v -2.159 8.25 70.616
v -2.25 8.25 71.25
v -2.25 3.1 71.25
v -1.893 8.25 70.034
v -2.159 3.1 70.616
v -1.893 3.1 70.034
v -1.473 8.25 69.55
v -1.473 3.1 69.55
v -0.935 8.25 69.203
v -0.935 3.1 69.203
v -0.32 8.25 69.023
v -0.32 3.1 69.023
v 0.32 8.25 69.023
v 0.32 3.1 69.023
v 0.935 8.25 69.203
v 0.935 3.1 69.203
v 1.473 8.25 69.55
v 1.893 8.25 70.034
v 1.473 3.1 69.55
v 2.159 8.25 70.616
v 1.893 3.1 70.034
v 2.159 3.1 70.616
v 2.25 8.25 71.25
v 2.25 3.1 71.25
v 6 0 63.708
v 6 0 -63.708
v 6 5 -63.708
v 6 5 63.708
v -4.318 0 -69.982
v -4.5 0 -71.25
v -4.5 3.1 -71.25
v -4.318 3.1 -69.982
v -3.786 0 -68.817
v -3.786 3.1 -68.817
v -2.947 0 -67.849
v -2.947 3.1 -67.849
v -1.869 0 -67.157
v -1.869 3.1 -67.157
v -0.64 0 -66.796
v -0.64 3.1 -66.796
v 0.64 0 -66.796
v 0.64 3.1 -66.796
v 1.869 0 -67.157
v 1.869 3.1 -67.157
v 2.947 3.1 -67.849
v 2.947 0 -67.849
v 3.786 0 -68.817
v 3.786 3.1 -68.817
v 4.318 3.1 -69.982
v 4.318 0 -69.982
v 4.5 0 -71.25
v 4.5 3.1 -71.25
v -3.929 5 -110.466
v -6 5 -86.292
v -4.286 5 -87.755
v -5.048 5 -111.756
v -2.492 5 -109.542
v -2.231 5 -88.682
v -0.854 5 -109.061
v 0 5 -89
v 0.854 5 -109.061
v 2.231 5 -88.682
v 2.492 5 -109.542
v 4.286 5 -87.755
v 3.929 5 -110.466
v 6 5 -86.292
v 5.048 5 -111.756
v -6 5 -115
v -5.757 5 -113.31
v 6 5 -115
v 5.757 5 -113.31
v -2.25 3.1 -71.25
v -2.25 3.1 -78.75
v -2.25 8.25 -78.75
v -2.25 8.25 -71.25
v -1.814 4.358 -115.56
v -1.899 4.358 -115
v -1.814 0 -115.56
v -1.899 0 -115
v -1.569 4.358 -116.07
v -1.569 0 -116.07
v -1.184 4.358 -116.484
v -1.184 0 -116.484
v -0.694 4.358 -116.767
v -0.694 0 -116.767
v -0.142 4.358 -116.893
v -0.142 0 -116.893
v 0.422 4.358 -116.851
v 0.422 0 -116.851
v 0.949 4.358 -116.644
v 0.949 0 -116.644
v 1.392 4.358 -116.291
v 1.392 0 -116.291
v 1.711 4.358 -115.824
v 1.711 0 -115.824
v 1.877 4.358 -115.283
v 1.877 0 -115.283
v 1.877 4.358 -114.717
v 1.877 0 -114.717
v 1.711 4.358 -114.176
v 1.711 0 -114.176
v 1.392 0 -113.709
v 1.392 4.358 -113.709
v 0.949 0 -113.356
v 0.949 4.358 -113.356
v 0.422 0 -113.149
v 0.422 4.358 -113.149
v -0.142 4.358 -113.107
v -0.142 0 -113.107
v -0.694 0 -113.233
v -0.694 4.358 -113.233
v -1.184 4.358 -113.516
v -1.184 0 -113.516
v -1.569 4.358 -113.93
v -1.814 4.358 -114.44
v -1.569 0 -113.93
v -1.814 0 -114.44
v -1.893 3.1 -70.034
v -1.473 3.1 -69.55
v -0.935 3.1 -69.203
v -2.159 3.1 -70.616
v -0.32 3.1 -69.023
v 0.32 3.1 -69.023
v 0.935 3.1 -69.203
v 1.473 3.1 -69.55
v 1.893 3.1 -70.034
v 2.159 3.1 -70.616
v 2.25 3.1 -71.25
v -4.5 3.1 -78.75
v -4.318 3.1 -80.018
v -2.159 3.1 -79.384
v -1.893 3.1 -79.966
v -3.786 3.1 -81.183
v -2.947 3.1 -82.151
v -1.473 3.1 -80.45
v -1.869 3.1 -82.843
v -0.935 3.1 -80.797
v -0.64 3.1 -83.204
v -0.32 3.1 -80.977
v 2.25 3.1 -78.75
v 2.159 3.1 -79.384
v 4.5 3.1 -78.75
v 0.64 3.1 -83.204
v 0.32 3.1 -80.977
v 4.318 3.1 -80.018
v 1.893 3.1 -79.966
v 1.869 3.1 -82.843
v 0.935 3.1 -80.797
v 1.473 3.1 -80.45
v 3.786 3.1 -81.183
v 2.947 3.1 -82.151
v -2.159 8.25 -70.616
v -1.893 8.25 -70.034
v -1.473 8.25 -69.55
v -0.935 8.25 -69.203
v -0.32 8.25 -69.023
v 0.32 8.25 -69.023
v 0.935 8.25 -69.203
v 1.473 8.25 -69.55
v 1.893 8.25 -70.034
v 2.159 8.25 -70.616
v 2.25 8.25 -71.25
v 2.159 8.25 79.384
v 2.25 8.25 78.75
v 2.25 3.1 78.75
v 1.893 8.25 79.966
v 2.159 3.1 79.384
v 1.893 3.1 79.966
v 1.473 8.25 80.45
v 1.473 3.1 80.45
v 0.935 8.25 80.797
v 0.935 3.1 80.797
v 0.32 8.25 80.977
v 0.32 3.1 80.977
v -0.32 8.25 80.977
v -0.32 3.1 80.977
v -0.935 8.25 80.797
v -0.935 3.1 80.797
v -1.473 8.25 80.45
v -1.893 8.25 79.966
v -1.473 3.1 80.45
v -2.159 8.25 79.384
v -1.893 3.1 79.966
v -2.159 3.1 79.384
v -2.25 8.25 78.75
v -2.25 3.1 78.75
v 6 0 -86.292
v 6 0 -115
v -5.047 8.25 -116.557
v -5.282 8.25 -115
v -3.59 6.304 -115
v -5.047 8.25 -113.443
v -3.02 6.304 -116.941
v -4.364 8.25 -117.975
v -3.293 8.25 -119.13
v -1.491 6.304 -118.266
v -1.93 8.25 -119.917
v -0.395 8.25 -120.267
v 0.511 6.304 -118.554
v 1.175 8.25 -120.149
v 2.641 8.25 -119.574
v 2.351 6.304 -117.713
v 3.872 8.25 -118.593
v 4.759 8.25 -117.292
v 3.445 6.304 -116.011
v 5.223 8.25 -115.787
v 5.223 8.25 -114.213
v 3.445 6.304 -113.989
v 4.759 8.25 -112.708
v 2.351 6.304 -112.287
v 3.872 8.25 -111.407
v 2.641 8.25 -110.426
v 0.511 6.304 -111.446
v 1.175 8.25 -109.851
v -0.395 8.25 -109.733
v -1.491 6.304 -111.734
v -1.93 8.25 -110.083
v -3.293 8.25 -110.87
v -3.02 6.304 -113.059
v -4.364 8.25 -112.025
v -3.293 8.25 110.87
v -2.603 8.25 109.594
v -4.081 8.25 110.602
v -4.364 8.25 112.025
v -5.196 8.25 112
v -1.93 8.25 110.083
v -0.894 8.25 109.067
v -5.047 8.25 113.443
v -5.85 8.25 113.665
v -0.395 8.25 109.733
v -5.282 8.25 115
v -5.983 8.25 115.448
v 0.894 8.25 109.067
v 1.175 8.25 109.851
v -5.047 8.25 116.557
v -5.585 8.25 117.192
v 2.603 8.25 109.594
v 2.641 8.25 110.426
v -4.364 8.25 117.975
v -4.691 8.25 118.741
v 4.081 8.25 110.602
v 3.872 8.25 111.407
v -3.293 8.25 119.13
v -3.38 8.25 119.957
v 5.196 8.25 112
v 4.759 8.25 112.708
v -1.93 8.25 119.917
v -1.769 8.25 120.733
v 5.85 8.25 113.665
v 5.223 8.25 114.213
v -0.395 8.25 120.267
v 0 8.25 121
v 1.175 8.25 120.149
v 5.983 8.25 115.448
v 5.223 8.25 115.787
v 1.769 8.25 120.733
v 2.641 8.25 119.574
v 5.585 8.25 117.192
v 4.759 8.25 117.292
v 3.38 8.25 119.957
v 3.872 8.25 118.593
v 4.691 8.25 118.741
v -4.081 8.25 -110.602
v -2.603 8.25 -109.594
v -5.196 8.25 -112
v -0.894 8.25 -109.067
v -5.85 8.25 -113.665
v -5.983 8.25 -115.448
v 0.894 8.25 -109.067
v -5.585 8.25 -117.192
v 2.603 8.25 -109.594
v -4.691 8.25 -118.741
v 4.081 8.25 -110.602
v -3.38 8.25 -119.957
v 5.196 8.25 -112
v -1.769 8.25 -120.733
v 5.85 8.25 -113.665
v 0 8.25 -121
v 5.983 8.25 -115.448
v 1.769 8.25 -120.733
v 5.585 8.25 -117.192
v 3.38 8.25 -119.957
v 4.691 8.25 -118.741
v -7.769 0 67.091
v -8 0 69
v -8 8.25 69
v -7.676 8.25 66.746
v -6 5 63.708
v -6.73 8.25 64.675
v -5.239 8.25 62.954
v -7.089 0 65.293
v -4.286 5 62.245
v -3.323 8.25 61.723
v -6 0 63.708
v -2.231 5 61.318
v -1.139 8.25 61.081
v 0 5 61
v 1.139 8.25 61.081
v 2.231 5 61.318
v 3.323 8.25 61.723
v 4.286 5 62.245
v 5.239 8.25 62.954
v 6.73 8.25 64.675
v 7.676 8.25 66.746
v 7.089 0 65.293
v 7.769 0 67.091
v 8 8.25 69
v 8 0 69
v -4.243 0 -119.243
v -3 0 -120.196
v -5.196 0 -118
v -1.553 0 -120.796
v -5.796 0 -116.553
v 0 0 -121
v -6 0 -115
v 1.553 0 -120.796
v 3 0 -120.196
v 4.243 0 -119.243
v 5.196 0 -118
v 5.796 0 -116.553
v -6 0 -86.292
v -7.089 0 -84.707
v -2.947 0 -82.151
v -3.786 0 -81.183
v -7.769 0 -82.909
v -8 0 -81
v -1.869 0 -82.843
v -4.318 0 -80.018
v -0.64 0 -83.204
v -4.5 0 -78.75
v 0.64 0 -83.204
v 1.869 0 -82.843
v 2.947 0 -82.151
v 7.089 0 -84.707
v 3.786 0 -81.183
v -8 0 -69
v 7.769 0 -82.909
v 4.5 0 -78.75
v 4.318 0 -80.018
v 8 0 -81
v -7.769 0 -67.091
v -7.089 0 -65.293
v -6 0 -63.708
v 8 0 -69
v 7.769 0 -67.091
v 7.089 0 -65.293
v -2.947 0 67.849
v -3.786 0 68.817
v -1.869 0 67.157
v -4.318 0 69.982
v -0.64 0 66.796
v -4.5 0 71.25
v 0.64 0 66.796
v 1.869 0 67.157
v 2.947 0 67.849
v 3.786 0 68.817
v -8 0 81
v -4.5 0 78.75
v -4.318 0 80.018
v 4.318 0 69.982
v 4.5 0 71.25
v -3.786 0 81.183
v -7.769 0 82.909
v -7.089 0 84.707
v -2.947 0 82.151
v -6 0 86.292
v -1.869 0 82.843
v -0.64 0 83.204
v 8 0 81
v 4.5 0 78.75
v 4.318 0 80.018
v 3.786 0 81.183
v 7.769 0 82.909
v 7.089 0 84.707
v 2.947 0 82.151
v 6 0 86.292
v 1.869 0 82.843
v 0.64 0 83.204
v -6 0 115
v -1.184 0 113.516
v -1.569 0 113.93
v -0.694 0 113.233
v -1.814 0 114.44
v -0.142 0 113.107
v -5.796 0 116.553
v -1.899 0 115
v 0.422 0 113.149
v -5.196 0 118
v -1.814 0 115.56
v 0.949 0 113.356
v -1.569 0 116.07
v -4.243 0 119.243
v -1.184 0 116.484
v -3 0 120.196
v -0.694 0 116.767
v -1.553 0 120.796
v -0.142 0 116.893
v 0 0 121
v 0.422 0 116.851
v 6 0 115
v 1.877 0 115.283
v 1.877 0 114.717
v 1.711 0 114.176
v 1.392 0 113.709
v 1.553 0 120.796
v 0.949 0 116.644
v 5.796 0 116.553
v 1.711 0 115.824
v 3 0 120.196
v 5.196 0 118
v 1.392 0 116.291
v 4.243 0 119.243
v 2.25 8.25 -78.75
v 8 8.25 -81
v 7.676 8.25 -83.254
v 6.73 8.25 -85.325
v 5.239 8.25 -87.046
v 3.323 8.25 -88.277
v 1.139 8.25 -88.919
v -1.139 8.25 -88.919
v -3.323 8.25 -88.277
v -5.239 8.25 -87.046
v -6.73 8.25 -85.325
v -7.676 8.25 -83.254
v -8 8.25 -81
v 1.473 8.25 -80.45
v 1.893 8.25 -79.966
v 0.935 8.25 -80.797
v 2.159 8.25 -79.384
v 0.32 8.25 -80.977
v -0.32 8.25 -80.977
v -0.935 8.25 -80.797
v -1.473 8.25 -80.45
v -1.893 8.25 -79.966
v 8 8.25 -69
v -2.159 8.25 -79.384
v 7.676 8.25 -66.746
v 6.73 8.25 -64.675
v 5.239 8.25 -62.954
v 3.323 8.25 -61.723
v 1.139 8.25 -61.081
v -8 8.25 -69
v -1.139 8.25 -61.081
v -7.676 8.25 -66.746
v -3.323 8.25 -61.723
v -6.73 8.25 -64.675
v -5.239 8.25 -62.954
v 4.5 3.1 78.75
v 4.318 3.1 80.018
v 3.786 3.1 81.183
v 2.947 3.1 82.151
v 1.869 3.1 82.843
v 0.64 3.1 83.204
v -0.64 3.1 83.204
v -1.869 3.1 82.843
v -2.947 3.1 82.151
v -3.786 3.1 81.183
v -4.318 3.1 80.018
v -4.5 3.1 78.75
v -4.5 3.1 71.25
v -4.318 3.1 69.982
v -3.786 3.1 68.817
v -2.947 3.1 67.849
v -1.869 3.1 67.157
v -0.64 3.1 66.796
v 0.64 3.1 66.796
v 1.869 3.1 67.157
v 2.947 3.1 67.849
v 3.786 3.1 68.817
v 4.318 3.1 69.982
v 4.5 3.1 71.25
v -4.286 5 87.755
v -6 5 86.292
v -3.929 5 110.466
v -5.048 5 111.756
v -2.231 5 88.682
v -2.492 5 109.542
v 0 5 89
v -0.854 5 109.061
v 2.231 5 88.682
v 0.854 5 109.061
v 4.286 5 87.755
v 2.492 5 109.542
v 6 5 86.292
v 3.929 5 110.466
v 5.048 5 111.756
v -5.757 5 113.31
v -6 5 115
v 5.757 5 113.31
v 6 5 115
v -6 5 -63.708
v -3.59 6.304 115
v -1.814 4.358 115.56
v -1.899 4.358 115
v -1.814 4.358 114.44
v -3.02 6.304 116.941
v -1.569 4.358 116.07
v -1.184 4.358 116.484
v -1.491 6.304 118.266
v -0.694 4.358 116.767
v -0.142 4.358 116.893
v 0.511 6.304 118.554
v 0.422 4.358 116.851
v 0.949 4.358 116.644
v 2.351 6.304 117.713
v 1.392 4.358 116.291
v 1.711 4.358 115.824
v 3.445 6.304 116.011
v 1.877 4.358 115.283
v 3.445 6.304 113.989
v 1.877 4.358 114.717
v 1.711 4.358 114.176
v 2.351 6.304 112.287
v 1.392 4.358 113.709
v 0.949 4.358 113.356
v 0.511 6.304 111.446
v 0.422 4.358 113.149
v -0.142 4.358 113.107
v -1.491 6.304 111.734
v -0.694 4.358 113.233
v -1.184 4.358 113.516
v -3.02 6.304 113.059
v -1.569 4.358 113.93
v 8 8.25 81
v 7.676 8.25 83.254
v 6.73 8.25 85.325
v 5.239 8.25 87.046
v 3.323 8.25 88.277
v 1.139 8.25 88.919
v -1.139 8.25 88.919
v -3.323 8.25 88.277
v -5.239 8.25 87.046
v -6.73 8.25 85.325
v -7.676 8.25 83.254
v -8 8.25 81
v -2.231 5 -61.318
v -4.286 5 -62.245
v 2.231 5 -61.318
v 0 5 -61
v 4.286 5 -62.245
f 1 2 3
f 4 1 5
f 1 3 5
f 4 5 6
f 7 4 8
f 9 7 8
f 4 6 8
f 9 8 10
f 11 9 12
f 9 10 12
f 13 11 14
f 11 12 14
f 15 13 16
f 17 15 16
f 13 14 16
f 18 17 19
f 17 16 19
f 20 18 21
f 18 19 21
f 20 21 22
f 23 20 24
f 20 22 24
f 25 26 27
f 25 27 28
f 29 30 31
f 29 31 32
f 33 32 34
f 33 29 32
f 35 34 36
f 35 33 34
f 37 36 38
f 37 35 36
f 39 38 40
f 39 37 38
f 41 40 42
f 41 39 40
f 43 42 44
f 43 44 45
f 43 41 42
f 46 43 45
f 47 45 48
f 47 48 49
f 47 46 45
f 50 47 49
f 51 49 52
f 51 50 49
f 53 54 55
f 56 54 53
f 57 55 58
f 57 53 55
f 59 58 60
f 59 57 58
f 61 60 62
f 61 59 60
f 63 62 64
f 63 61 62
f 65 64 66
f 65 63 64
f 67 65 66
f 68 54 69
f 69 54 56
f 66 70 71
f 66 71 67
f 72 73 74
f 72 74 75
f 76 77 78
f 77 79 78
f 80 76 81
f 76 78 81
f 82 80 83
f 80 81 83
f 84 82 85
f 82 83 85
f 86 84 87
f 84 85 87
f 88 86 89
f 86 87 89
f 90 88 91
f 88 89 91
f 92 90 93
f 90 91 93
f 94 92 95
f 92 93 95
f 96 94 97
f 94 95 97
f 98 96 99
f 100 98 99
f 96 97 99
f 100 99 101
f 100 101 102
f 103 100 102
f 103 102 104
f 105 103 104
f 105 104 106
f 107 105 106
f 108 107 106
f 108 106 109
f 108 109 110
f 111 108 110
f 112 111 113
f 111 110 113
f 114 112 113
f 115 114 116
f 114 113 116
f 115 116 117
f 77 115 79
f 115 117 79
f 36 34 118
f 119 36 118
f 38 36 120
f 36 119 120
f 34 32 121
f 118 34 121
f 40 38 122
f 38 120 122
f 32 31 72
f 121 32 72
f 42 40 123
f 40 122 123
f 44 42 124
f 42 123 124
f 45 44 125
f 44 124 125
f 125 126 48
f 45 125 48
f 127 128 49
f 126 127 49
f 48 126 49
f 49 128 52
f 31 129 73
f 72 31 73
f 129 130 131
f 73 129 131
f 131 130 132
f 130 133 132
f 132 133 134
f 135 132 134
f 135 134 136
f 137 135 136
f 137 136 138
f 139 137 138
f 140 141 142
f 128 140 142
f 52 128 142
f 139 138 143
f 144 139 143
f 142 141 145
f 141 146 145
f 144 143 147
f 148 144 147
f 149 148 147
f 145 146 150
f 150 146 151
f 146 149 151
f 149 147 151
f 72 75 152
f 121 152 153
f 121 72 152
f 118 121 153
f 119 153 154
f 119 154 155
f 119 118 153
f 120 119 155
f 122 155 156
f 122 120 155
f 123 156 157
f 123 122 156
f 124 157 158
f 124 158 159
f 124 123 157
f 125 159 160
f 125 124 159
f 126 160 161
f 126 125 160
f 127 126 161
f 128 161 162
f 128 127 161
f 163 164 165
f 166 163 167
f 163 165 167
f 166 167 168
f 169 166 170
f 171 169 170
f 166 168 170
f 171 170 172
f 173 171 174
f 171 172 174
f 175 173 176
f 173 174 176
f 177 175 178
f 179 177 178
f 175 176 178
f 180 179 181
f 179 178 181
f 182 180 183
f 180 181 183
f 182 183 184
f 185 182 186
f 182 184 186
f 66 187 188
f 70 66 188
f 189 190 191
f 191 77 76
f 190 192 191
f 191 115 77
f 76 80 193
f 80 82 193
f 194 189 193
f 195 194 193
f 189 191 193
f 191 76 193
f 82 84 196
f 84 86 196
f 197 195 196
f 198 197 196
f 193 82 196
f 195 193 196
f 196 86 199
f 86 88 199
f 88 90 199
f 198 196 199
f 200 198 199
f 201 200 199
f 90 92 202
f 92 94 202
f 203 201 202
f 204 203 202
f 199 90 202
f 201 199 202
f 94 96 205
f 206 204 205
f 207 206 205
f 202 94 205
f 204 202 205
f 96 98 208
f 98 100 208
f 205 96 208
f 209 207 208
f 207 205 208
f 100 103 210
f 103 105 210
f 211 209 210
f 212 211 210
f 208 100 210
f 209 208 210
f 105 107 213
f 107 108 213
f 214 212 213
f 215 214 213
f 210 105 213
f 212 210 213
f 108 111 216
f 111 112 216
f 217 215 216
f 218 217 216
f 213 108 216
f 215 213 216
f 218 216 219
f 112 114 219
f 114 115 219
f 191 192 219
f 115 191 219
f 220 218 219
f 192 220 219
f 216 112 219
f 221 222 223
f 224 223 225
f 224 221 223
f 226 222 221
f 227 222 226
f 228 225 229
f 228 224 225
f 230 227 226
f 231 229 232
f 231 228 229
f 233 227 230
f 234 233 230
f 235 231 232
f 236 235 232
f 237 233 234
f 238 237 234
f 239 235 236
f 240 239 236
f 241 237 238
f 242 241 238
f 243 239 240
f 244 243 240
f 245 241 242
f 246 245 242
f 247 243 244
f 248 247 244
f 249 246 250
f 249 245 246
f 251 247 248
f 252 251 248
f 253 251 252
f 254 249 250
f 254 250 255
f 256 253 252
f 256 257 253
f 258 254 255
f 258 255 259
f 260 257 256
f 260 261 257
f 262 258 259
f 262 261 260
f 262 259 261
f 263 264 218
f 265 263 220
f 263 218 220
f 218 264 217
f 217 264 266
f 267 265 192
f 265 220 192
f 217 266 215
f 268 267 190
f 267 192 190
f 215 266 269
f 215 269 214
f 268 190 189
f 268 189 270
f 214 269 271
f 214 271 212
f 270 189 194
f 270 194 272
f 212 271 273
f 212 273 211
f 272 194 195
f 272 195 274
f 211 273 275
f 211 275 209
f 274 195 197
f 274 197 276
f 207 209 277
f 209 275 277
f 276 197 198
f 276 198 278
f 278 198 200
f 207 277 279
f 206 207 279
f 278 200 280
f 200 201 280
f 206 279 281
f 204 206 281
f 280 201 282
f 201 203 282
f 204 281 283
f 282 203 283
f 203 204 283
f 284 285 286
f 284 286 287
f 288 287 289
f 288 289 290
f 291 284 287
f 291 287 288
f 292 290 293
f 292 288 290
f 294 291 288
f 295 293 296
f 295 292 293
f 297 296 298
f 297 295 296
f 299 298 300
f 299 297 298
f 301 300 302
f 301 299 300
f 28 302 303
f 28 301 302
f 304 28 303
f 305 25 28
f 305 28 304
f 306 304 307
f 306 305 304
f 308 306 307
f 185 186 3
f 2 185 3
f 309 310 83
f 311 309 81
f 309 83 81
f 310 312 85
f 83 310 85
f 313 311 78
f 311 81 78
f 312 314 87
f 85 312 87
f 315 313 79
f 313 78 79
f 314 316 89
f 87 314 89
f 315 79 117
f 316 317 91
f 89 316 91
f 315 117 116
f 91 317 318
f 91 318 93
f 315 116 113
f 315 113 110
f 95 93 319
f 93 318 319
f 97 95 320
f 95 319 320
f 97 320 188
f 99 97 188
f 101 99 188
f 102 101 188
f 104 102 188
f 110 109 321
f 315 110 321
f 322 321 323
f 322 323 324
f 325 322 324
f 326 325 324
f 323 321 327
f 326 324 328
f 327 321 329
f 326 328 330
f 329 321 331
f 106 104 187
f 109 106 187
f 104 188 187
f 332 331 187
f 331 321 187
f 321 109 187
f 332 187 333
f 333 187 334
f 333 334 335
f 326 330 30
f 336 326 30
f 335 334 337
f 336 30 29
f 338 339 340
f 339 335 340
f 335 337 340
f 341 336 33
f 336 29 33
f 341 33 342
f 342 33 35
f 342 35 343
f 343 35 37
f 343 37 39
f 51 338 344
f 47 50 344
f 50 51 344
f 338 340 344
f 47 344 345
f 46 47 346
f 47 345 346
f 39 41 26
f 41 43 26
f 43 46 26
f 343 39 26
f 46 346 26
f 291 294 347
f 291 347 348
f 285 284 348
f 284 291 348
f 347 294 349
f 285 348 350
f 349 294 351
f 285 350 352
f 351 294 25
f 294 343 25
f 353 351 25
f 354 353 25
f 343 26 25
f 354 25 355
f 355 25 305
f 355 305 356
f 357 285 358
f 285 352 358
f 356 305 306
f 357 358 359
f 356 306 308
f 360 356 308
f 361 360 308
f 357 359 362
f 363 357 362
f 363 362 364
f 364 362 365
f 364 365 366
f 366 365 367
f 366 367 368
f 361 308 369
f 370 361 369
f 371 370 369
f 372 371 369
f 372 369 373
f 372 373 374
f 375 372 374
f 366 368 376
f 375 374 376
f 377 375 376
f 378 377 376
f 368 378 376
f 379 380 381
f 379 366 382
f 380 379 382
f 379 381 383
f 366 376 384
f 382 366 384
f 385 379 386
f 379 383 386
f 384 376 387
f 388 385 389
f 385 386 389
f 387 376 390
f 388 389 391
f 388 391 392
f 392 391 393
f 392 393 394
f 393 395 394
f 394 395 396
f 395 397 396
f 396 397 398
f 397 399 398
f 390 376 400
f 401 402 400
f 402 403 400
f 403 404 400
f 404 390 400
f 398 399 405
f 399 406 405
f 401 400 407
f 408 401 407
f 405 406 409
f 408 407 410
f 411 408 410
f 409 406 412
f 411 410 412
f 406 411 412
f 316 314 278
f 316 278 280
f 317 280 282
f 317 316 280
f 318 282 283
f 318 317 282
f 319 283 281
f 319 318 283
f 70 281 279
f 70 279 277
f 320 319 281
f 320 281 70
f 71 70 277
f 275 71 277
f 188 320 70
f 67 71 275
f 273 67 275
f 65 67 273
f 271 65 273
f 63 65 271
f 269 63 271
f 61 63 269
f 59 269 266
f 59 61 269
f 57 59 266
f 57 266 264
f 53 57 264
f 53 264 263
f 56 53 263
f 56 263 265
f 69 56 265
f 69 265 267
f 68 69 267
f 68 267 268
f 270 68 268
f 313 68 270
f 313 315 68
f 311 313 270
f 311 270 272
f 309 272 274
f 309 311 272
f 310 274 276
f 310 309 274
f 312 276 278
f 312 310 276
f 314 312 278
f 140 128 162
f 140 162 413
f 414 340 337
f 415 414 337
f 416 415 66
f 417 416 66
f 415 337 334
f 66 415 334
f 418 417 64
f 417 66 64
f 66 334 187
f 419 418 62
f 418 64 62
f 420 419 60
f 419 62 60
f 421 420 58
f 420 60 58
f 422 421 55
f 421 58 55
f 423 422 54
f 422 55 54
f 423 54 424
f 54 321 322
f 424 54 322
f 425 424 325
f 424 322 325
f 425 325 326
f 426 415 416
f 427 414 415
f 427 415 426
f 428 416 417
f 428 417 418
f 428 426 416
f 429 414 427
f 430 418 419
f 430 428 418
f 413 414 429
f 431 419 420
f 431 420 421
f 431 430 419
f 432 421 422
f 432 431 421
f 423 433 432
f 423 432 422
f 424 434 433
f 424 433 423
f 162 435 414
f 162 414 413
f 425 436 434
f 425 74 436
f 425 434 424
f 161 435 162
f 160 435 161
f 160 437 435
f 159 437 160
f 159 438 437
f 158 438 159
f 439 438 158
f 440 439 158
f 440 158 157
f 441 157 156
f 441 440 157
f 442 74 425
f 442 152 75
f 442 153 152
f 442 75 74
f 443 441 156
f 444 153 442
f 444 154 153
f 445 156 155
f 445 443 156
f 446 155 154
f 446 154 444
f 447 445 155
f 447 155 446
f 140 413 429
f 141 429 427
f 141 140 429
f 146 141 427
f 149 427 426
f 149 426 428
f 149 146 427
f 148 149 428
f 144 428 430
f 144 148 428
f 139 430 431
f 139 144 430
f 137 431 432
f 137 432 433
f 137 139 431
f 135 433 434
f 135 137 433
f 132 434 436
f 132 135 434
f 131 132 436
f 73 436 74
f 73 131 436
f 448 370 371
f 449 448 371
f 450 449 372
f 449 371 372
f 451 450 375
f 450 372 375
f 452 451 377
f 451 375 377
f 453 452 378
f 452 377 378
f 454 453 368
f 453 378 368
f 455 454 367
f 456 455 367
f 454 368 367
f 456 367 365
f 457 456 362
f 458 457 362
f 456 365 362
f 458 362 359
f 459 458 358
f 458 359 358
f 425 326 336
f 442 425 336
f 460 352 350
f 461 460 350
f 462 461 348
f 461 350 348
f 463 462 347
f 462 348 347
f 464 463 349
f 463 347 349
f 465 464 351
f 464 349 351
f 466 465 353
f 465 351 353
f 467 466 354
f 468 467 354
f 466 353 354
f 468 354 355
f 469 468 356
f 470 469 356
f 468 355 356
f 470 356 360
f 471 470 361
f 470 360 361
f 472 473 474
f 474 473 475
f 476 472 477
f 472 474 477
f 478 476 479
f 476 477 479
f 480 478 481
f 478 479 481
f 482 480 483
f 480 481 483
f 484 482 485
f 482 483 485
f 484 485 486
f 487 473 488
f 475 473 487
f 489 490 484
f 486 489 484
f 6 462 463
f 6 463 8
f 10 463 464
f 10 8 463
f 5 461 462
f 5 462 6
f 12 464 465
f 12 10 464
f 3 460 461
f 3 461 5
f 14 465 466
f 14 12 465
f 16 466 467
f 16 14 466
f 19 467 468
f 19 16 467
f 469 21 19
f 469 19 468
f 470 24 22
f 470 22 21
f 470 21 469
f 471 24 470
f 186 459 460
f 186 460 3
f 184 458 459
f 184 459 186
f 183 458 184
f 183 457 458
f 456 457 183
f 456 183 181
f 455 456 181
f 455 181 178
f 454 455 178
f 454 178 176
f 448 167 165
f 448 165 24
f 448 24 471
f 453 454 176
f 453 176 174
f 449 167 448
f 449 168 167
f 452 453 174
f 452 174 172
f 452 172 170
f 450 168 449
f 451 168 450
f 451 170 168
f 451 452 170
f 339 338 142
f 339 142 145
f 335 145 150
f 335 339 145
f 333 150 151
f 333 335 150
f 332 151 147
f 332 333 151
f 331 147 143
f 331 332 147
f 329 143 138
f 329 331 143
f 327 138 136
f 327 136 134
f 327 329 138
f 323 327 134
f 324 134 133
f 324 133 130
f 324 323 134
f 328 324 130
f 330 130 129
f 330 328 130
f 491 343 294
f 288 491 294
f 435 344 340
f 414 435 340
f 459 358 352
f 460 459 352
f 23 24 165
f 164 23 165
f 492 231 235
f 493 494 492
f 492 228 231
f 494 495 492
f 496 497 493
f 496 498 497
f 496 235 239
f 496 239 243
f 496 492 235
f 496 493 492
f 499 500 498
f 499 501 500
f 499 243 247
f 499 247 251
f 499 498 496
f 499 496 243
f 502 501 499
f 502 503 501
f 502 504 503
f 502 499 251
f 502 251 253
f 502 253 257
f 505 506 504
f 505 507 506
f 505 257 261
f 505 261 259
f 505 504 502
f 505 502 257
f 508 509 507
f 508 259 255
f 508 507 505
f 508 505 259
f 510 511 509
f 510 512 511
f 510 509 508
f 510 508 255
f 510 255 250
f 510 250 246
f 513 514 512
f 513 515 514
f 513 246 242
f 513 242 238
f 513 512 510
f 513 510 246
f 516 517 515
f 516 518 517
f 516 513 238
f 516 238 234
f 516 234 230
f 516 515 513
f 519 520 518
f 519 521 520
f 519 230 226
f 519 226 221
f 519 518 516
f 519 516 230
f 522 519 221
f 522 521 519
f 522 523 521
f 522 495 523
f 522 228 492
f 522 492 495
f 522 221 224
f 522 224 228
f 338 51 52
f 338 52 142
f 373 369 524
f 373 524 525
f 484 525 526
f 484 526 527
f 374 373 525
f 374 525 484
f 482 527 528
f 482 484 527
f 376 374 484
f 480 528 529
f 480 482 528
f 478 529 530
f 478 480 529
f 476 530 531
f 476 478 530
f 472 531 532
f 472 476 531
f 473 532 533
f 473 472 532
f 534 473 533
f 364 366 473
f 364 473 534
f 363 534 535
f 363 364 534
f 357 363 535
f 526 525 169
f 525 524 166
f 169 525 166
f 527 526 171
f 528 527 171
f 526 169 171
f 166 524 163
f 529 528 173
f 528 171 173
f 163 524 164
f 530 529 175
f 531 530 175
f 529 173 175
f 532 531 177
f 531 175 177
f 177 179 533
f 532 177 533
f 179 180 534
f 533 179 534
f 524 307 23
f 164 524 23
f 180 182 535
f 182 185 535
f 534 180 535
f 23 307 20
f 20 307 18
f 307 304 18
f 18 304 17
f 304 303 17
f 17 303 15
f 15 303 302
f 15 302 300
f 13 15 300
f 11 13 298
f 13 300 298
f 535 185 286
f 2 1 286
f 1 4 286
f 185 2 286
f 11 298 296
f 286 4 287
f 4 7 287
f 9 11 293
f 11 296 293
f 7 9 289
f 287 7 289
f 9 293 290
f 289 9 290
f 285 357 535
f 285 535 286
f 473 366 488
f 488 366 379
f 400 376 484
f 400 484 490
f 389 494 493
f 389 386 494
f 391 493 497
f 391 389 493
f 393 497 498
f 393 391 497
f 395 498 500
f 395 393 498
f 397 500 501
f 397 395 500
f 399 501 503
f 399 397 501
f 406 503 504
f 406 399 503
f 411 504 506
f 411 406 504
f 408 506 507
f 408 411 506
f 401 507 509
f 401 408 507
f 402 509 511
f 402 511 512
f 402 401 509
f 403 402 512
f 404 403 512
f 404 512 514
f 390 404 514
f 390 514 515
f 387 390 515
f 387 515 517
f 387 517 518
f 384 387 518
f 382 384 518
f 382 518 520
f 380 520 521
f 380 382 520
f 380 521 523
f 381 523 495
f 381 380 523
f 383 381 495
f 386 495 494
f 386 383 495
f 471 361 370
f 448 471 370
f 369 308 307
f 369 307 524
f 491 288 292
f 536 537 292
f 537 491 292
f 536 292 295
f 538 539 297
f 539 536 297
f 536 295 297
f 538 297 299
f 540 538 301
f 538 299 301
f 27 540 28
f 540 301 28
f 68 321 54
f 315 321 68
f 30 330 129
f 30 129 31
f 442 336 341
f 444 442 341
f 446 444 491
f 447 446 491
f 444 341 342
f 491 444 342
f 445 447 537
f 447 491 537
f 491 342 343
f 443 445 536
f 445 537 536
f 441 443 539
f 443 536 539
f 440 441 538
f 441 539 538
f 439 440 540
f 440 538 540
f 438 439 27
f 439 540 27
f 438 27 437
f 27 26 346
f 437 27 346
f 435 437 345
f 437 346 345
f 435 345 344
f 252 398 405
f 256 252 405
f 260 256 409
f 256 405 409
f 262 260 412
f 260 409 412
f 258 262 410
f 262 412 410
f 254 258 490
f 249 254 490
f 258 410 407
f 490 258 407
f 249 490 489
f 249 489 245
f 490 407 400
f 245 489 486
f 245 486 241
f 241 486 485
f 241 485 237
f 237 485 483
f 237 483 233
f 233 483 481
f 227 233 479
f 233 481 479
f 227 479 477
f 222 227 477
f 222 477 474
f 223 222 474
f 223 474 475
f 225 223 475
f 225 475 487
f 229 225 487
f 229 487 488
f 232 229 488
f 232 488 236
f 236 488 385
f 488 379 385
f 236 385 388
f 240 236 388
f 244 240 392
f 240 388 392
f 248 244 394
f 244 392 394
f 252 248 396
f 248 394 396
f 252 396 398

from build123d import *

# Parameters (mm, degrees)
ARM_BASE_SKETCH_W                  = 12
ARM_BASE_SKETCH_H                  = 115
ARM_BASE_EXTRUDE_DEPTH             = 5
SCREW_BASES_SKETCH_R               = 6
SCREW_BASES_EXTRUDE_DEPTH          = 8.25
POWER_SUPPLY_MOUNTING_SLOT_DEPTH   = 8.25
POWER_SUPPLY_MOUNTING_SLOT_2_DEPTH = 3.1
NO_6_MOUNTING_SCREWS_D             = 3.7973
NO_6_MOUNTING_SCREWS_CSINK_D       = 10.563733
NO_6_MOUNTING_SCREWS_CSINK_ANGLE   = 82


# Read off the part's stored shape, not the designer's step: Power Supply Mounting Slot
with BuildPart() as part:
    # Arm Base Sketch → Arm Base Extrude (new body)
    with BuildSketch(Plane(origin=(0, 0, 0), x_dir=(1, 0, 0), z_dir=(0, 1, 0))):
        with Locations((0, 57.5)):
            Rectangle(ARM_BASE_SKETCH_W, ARM_BASE_SKETCH_H)
    extrude(amount=ARM_BASE_EXTRUDE_DEPTH)

    # Screw Bases Sketch → Screw Bases Extrude (add)
    with BuildSketch(Plane.XZ):
        with Locations(Location((0, -115, 0), (0, 0, 270))):
            Circle(SCREW_BASES_SKETCH_R)
        with BuildLine():
            Line((-8, -81), (-8, -69))
            ThreePointArc((-8, -69), (0, -61), (8, -69))
            Line((8, -69), (8, -81))
            ThreePointArc((8, -81), (0, -89), (-8, -81))
        make_face()
    extrude(amount=-SCREW_BASES_EXTRUDE_DEPTH)

    # Power Supply Mounting Slot outline → Power Supply Mounting Slot (cut)
    with BuildSketch(Plane(origin=(0, 0, 0), x_dir=(1, 0, 0), z_dir=(0, 1, 0))):
        with BuildLine():
            ThreePointArc((-2.25, 71.25), (0, 69), (2.25, 71.25))
            Line((2.25, 71.25), (2.25, 78.75))
            ThreePointArc((2.25, 78.75), (0, 81), (-2.25, 78.75))
            Line((-2.25, 78.75), (-2.25, 71.25))
        make_face()
    extrude(amount=POWER_SUPPLY_MOUNTING_SLOT_DEPTH, mode=Mode.SUBTRACT)

    # Power Supply Mounting Slot 2 outline → Power Supply Mounting Slot 2 (cut)
    with BuildSketch(Plane(origin=(0, 0, 0), x_dir=(1, 0, 0), z_dir=(0, 1, 0))):
        with BuildLine():
            ThreePointArc((-4.5, 71.25), (0, 66.75), (4.5, 71.25))
            Line((4.5, 71.25), (4.5, 78.75))
            ThreePointArc((4.5, 78.75), (0, 83.25), (-4.5, 78.75))
            Line((-4.5, 78.75), (-4.5, 71.25))
        make_face()
        with BuildLine():
            Line((2.25, 78.75), (2.25, 71.25))
            ThreePointArc((2.25, 71.25), (0, 69), (-2.25, 71.25))
            Line((-2.25, 71.25), (-2.25, 78.75))
            ThreePointArc((-2.25, 78.75), (0, 81), (2.25, 78.75))
        make_face(mode=Mode.SUBTRACT)
    extrude(amount=POWER_SUPPLY_MOUNTING_SLOT_2_DEPTH, mode=Mode.SUBTRACT)

    # No. 6 Mounting Screws (through all)
    with Locations(Plane(origin=(0, 8.25, 0), x_dir=(1, 0, 0), z_dir=(0, 1, 0))):
        with Locations((0, 115)):
            CounterSinkHole(NO_6_MOUNTING_SCREWS_D / 2, NO_6_MOUNTING_SCREWS_CSINK_D / 2, counter_sink_angle=NO_6_MOUNTING_SCREWS_CSINK_ANGLE)

    # Mirror 2: part across plane


with BuildPart() as part_1:
    add(part.part)
    add(part.part.mirror(Plane(origin=(6, 5, 0), x_dir=(1, 0, 0), z_dir=(0, 0, -1))))


solid = part_1.part
